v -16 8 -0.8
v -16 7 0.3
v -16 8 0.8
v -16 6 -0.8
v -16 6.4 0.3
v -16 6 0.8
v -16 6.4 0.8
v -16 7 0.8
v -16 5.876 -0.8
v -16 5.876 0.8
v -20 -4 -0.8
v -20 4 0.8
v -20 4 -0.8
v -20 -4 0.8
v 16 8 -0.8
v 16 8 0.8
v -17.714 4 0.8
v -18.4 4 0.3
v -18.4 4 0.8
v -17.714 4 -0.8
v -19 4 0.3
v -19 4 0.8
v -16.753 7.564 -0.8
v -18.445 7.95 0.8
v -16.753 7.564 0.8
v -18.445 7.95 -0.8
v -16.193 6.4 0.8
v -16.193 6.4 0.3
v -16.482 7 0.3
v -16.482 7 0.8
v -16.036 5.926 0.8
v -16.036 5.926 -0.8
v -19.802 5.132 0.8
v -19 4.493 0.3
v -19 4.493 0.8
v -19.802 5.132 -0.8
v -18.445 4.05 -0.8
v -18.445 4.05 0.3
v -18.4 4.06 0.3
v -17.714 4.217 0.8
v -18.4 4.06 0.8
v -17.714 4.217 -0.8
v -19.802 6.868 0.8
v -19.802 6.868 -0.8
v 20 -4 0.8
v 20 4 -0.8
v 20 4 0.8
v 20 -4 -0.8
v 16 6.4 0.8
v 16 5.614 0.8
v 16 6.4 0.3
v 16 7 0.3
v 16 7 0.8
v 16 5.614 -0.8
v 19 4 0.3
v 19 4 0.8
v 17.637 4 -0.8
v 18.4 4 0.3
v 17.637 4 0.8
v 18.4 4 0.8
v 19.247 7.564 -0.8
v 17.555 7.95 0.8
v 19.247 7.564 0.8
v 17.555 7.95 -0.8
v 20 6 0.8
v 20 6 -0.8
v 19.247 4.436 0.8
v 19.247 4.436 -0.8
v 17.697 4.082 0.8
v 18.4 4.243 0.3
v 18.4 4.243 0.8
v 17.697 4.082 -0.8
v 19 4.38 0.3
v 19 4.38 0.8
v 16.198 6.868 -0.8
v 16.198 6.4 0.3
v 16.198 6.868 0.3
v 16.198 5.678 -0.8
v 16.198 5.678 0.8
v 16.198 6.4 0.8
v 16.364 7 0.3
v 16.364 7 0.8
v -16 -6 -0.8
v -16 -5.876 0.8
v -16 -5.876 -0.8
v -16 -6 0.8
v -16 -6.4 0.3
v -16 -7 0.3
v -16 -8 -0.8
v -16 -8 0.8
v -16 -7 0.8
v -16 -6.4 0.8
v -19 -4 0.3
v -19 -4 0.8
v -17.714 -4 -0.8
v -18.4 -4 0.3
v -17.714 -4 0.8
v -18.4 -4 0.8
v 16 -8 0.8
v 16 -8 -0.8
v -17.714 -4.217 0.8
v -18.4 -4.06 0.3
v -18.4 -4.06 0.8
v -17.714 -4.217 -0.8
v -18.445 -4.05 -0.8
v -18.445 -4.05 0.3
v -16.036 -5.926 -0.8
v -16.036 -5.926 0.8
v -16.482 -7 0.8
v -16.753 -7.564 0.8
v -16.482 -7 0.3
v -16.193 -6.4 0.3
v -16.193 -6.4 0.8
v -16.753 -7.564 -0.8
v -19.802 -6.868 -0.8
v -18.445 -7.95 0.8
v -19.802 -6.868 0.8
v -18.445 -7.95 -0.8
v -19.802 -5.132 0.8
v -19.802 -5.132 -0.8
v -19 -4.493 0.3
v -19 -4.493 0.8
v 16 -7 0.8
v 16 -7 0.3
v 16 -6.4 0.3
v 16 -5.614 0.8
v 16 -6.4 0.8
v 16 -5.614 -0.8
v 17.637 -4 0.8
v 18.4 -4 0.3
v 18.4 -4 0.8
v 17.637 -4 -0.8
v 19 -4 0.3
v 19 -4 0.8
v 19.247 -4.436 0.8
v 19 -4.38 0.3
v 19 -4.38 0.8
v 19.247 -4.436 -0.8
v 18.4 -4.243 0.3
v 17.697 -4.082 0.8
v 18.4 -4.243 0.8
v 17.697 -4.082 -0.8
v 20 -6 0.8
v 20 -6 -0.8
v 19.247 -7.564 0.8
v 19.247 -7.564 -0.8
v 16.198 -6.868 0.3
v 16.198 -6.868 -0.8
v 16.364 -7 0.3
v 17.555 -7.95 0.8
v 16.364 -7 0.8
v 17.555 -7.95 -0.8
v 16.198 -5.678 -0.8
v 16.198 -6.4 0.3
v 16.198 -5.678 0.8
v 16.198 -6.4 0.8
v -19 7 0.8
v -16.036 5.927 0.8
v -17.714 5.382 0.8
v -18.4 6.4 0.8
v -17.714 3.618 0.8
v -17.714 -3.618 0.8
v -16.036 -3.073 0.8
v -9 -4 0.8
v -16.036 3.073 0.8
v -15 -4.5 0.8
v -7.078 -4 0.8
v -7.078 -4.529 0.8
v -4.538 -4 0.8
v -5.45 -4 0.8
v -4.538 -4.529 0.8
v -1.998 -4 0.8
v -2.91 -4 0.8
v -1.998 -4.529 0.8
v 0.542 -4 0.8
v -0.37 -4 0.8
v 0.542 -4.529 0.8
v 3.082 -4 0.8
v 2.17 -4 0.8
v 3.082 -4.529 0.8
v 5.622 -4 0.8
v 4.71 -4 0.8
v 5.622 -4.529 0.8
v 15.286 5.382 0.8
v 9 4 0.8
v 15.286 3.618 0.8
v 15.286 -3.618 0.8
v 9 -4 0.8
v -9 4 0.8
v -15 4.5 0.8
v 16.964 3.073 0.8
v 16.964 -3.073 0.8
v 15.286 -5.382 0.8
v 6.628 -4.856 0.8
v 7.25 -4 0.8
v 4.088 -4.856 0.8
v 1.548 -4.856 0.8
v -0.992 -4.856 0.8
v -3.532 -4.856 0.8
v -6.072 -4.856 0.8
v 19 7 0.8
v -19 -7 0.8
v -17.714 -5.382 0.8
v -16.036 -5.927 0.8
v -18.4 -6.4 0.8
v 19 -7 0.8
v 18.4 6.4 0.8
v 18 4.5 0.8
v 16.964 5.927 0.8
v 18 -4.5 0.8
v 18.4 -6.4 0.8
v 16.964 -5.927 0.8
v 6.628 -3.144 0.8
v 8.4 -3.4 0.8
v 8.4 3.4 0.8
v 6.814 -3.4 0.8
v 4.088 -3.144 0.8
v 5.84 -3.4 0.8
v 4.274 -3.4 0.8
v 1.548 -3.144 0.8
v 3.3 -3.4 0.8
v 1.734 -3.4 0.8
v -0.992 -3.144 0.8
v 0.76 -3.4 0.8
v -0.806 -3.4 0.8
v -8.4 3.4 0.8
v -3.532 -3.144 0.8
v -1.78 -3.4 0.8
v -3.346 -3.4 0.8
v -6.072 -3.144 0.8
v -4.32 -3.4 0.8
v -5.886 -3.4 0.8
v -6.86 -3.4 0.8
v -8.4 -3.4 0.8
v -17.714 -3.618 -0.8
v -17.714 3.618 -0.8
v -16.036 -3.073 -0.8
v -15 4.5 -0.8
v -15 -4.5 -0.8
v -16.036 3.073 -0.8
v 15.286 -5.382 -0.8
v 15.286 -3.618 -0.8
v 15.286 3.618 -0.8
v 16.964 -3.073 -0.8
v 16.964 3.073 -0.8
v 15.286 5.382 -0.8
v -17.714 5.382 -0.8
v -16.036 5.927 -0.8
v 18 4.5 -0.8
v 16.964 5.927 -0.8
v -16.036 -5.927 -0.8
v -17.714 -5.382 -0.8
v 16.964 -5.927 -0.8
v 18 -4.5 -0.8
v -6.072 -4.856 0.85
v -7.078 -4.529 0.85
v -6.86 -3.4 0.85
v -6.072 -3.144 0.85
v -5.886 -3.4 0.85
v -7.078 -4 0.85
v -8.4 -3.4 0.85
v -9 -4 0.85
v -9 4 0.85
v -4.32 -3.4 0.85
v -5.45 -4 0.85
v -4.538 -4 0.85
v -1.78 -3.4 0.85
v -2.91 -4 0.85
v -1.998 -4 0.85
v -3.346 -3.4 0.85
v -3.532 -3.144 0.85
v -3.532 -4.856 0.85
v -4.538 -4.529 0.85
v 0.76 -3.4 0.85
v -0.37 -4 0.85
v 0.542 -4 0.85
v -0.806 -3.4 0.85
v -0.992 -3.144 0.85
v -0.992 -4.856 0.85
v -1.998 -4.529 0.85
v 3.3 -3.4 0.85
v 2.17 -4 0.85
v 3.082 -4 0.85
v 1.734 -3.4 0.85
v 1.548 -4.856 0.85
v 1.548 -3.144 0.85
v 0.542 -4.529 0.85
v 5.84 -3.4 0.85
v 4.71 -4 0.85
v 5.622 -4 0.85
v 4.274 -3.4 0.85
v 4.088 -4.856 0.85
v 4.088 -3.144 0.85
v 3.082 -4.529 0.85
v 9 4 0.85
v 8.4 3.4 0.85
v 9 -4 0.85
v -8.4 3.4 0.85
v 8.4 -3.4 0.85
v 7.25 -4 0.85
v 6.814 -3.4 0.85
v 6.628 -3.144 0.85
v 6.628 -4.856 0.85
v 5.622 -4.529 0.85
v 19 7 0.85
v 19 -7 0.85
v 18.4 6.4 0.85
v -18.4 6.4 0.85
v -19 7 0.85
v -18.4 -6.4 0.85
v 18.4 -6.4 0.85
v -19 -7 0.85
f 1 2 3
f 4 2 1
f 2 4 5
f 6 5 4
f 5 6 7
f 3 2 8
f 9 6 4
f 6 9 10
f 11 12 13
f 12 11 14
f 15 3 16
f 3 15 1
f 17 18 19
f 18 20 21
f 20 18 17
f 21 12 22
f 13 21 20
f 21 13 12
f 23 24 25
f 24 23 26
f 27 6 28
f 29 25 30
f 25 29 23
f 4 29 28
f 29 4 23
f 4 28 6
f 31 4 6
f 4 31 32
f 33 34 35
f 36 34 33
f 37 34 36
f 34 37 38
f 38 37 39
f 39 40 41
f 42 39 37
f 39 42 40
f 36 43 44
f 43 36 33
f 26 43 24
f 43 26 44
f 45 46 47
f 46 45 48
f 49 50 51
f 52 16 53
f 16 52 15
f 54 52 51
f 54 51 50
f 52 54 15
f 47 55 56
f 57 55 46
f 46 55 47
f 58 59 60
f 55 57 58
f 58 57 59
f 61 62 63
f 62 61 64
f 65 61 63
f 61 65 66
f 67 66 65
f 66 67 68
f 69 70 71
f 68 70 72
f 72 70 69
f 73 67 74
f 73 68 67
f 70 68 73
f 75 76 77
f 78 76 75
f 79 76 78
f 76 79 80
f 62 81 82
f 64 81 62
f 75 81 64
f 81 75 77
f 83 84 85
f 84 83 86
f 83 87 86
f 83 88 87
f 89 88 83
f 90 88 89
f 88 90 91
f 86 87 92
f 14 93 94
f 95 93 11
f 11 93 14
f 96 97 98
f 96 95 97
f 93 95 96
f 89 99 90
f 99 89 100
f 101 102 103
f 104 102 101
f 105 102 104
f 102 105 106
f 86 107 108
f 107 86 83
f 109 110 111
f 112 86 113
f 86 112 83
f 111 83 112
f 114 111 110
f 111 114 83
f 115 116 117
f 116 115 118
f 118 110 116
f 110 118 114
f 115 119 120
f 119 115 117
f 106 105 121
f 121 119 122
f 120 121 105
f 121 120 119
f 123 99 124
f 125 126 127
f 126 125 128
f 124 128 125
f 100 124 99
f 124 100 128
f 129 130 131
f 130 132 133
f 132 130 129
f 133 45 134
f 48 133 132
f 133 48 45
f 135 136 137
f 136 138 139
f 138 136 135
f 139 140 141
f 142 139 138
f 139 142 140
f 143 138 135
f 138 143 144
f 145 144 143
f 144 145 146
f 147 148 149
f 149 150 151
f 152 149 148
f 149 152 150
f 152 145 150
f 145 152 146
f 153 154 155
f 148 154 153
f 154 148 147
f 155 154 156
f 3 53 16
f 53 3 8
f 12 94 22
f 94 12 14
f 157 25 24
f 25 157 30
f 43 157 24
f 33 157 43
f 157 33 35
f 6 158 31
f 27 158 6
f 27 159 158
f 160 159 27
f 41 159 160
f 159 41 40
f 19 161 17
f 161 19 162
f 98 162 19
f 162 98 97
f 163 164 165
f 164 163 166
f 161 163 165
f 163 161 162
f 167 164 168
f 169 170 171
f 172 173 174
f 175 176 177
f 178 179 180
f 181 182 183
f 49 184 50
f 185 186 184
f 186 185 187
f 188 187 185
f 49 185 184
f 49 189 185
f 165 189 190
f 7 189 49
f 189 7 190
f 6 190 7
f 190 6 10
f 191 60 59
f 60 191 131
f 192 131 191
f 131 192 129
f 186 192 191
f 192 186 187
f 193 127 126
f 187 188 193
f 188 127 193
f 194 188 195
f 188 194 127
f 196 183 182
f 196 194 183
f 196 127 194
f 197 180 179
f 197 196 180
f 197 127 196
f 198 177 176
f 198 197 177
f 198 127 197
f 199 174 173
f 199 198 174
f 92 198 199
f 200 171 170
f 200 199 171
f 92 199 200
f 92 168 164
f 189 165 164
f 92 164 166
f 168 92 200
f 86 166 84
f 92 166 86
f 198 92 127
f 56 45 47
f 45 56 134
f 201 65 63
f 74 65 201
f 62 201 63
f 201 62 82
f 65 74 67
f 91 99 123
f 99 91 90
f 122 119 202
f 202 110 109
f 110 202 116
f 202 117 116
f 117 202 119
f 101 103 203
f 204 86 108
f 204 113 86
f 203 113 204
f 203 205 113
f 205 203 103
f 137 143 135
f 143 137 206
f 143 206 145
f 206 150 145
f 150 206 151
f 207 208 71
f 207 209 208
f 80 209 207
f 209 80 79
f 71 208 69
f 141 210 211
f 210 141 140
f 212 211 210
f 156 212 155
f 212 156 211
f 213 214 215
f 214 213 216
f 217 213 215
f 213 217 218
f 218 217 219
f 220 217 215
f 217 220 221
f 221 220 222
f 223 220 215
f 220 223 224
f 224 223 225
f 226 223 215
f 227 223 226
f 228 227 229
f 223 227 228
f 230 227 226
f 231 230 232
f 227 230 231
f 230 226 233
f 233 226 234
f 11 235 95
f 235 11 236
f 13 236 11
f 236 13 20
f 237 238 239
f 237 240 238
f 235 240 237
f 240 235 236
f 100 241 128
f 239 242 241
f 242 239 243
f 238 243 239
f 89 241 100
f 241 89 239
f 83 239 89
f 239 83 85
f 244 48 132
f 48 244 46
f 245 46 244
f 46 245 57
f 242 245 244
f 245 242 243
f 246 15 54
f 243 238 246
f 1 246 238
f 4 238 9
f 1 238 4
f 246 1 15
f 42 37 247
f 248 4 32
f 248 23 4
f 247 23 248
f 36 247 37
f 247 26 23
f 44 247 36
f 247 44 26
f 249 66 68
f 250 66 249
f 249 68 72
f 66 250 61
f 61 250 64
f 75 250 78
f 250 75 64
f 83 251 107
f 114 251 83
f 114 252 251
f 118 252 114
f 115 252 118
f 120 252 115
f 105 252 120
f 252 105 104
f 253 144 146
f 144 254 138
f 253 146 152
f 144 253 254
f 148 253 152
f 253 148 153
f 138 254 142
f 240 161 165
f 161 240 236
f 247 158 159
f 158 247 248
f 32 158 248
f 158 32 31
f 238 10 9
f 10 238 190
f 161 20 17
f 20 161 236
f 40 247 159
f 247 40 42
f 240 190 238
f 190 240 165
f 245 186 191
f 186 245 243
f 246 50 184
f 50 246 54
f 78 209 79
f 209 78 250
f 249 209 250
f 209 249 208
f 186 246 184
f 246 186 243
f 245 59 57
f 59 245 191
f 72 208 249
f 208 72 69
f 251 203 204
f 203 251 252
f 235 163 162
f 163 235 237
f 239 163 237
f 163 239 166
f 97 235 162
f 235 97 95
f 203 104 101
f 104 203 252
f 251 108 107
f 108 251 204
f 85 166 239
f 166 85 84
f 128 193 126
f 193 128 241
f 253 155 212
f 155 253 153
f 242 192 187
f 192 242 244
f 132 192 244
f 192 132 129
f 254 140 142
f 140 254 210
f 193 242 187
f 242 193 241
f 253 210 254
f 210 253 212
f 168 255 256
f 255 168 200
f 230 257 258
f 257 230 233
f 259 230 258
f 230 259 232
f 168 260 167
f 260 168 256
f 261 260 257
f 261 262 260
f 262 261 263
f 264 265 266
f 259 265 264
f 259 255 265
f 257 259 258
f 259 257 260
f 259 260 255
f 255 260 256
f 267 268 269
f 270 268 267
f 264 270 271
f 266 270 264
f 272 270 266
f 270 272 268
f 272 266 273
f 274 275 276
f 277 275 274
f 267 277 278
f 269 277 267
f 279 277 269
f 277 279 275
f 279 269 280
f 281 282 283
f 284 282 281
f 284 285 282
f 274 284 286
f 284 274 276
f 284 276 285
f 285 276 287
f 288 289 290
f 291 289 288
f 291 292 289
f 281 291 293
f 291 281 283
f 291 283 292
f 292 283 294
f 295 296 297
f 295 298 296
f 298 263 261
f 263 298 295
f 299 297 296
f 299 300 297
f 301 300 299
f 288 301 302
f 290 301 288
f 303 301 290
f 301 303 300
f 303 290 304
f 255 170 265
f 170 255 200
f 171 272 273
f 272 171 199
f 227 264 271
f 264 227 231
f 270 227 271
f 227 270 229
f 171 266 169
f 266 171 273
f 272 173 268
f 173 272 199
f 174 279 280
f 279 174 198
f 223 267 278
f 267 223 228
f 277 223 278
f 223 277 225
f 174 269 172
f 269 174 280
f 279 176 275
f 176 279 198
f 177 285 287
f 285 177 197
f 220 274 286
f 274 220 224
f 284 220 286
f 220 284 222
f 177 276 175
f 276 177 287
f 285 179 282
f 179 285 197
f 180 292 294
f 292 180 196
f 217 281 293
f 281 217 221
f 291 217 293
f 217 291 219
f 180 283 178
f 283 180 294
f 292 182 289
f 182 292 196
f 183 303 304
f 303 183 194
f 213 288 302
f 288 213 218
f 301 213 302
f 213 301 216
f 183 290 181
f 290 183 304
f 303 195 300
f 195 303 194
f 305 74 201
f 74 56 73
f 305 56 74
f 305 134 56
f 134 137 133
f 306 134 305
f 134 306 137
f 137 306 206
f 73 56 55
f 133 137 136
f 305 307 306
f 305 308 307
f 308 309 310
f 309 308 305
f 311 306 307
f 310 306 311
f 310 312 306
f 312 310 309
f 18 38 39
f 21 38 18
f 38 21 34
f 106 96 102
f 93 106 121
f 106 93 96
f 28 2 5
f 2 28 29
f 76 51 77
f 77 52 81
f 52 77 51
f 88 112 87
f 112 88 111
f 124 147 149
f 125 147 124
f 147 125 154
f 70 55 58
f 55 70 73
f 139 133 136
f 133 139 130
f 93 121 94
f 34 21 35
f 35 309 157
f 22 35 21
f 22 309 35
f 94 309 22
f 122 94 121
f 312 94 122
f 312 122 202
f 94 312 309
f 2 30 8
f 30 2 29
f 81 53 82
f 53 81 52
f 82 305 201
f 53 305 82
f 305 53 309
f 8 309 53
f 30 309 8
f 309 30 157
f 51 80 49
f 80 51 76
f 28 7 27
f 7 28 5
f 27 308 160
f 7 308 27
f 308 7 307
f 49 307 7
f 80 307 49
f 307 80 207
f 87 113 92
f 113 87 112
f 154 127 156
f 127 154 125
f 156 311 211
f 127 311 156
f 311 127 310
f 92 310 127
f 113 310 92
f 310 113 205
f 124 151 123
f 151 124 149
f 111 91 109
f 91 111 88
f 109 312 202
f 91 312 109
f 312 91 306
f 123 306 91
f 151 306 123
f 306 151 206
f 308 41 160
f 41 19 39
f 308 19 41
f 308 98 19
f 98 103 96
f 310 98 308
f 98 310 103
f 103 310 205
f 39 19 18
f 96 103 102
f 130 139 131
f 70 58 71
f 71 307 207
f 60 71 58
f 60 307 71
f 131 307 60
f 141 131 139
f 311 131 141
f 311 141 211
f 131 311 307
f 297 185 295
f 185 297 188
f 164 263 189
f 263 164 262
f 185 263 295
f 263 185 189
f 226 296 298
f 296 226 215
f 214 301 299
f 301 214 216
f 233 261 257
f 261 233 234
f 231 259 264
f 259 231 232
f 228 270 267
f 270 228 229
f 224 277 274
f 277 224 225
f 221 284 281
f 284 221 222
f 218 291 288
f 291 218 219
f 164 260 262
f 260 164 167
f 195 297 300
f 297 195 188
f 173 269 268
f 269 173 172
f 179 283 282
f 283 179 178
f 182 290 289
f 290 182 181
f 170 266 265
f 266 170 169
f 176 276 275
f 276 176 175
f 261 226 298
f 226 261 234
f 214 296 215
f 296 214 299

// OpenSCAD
// Parameters
pcb_length = 40.0; //[20.0:80.0:0.5]
pcb_width = 16.0; //[8.0:32.0:0.5]
pcb_thickness = 1.6; //[0.8:3.2:0.1]
corner_radius = 2.0; //[0.5:5.0:0.1]
hole_diameter = 3.0; //[1.5:6.0:0.1]
hole_edge_margin = 3.5; //[2.0:7.0:0.1]
copper_thickness = 0.05; //[0.01:0.2:0.01]
silkscreen_thickness = 0.05; //[0.01:0.2:0.01]
outline_thickness = 0.05; //[0.01:0.2:0.01]
feature_overlap = 0.5; //[0.2:2.0:0.1]
pad_diameter = 1.8; //[0.8:4.0:0.1]
pad_pitch = 2.54; //[1.27:5.08:0.01]
pad_row_count = 6; //[2:20:1]
pad_row_y_offset = 4.0; //[2.0:7.0:0.1]
silk_border_inset = 1.0; //[0.5:3.0:0.1]
silk_line_width = 0.6; //[0.2:1.5:0.1]
component_outline_length = 18.0; //[8.0:36.0:0.5]
component_outline_width = 8.0; //[4.0:14.0:0.5]
component_outline_line_width = 0.6; //[0.2:1.5:0.1]
component_outline_x_offset = 0.0; //[-10.0:10.0:0.5]
component_outline_y_offset = 0.0; //[-4.0:4.0:0.5]

// Base Shapes
module pcb_body() {
  color([0.0, 0.4, 0.2]) // Green PCB
  cube([pcb_length, pcb_width, pcb_thickness], center=true);
}

module rounded_corner_cutout_cyl() {
  cylinder(r=corner_radius, h=pcb_thickness + feature_overlap*2, center=true);
}

module rounded_corner_cutout_box() {
  cube([corner_radius*2, corner_radius*2, pcb_thickness + feature_overlap*2], center=true);
}

module mounting_hole_cyl() {
  cylinder(r=hole_diameter/2, h=pcb_thickness + feature_overlap*2, center=true);
}

module copper_pad_cyl() {
  color([0.72, 0.45, 0.2]) // Copper color
  cylinder(r=pad_diameter/2, h=copper_thickness + feature_overlap, center=true);
}

module silk_border_horiz() {
  color("White")
  cube([pcb_length - 2*silk_border_inset, silk_line_width, silkscreen_thickness + feature_overlap], center=true);
}

module silk_border_vert() {
  color("White")
  cube([silk_line_width, pcb_width - 2*silk_border_inset, silkscreen_thickness + feature_overlap], center=true);
}

module component_outline_horiz() {
  color("White")
  cube([component_outline_length, component_outline_line_width, outline_thickness + feature_overlap], center=true);
}

module component_outline_vert() {
  color("White")
  cube([component_outline_line_width, component_outline_width, outline_thickness + feature_overlap], center=true);
}

// Operations
module rounded_corners() {
  difference() {
    pcb_body();
    translate([-pcb_length/2 + corner_radius, pcb_width/2 - corner_radius, 0])
      difference() { rounded_corner_cutout_box(); rounded_corner_cutout_cyl(); }
    translate([pcb_length/2 - corner_radius, pcb_width/2 - corner_radius, 0])
      difference() { rounded_corner_cutout_box(); rounded_corner_cutout_cyl(); }
    translate([-pcb_length/2 + corner_radius, -pcb_width/2 + corner_radius, 0])
      difference() { rounded_corner_cutout_box(); rounded_corner_cutout_cyl(); }
    translate([pcb_length/2 - corner_radius, -pcb_width/2 + corner_radius, 0])
      difference() { rounded_corner_cutout_box(); rounded_corner_cutout_cyl(); }
  }
}

module mounting_holes() {
  difference() {
    rounded_corners();
    translate([-pcb_length/2 + hole_edge_margin, pcb_width/2 - hole_edge_margin, 0]) mounting_hole_cyl();
    translate([pcb_length/2 - hole_edge_margin, pcb_width/2 - hole_edge_margin, 0]) mounting_hole_cyl();
    translate([-pcb_length/2 + hole_edge_margin, -pcb_width/2 + hole_edge_margin, 0]) mounting_hole_cyl();
    translate([pcb_length/2 - hole_edge_margin, -pcb_width/2 + hole_edge_margin, 0]) mounting_hole_cyl();
  }
}

module copper_pads() {
  union() {
    for (i = [0:pad_row_count-1]) {
      translate([-(pad_pitch*(pad_row_count-1))/2 + pad_pitch*i, -pcb_width/2 + pad_row_y_offset, pcb_thickness/2 + (copper_thickness + feature_overlap)/2 - feature_overlap])
        copper_pad_cyl();
    }
  }
}

module silkscreen_markings() {
  union() {
    translate([0, pcb_width/2 - silk_border_inset - silk_line_width/2, pcb_thickness/2 + (silkscreen_thickness + feature_overlap)/2 - feature_overlap])
      silk_border_horiz();
    translate([0, -pcb_width/2 + silk_border_inset + silk_line_width/2, pcb_thickness/2 + (silkscreen_thickness + feature_overlap)/2 - feature_overlap])
      silk_border_horiz();
    translate([-pcb_length/2 + silk_border_inset + silk_line_width/2, 0, pcb_thickness/2 + (silkscreen_thickness + feature_overlap)/2 - feature_overlap])
      silk_border_vert();
    translate([pcb_length/2 - silk_border_inset - silk_line_width/2, 0, pcb_thickness/2 + (silkscreen_thickness + feature_overlap)/2 - feature_overlap])
      silk_border_vert();
  }
}

module components_outline() {
  union() {
    translate([component_outline_x_offset, component_outline_y_offset + component_outline_width/2 - component_outline_line_width/2, pcb_thickness/2 + (outline_thickness + feature_overlap)/2 - feature_overlap])
      component_outline_horiz();
    translate([component_outline_x_offset, component_outline_y_offset - component_outline_width/2 + component_outline_line_width/2, pcb_thickness/2 + (outline_thickness + feature_overlap)/2 - feature_overlap])
      component_outline_horiz();
    translate([component_outline_x_offset - component_outline_length/2 + component_outline_line_width/2, component_outline_y_offset, pcb_thickness/2 + (outline_thickness + feature_overlap)/2 - feature_overlap])
      component_outline_vert();
    translate([component_outline_x_offset + component_outline_length/2 - component_outline_line_width/2, component_outline_y_offset, pcb_thickness/2 + (outline_thickness + feature_overlap)/2 - feature_overlap])
      component_outline_vert();
  }
}

// Final Output
union() {
  mounting_holes();
  copper_pads();
  silkscreen_markings();
  components_outline();
}
